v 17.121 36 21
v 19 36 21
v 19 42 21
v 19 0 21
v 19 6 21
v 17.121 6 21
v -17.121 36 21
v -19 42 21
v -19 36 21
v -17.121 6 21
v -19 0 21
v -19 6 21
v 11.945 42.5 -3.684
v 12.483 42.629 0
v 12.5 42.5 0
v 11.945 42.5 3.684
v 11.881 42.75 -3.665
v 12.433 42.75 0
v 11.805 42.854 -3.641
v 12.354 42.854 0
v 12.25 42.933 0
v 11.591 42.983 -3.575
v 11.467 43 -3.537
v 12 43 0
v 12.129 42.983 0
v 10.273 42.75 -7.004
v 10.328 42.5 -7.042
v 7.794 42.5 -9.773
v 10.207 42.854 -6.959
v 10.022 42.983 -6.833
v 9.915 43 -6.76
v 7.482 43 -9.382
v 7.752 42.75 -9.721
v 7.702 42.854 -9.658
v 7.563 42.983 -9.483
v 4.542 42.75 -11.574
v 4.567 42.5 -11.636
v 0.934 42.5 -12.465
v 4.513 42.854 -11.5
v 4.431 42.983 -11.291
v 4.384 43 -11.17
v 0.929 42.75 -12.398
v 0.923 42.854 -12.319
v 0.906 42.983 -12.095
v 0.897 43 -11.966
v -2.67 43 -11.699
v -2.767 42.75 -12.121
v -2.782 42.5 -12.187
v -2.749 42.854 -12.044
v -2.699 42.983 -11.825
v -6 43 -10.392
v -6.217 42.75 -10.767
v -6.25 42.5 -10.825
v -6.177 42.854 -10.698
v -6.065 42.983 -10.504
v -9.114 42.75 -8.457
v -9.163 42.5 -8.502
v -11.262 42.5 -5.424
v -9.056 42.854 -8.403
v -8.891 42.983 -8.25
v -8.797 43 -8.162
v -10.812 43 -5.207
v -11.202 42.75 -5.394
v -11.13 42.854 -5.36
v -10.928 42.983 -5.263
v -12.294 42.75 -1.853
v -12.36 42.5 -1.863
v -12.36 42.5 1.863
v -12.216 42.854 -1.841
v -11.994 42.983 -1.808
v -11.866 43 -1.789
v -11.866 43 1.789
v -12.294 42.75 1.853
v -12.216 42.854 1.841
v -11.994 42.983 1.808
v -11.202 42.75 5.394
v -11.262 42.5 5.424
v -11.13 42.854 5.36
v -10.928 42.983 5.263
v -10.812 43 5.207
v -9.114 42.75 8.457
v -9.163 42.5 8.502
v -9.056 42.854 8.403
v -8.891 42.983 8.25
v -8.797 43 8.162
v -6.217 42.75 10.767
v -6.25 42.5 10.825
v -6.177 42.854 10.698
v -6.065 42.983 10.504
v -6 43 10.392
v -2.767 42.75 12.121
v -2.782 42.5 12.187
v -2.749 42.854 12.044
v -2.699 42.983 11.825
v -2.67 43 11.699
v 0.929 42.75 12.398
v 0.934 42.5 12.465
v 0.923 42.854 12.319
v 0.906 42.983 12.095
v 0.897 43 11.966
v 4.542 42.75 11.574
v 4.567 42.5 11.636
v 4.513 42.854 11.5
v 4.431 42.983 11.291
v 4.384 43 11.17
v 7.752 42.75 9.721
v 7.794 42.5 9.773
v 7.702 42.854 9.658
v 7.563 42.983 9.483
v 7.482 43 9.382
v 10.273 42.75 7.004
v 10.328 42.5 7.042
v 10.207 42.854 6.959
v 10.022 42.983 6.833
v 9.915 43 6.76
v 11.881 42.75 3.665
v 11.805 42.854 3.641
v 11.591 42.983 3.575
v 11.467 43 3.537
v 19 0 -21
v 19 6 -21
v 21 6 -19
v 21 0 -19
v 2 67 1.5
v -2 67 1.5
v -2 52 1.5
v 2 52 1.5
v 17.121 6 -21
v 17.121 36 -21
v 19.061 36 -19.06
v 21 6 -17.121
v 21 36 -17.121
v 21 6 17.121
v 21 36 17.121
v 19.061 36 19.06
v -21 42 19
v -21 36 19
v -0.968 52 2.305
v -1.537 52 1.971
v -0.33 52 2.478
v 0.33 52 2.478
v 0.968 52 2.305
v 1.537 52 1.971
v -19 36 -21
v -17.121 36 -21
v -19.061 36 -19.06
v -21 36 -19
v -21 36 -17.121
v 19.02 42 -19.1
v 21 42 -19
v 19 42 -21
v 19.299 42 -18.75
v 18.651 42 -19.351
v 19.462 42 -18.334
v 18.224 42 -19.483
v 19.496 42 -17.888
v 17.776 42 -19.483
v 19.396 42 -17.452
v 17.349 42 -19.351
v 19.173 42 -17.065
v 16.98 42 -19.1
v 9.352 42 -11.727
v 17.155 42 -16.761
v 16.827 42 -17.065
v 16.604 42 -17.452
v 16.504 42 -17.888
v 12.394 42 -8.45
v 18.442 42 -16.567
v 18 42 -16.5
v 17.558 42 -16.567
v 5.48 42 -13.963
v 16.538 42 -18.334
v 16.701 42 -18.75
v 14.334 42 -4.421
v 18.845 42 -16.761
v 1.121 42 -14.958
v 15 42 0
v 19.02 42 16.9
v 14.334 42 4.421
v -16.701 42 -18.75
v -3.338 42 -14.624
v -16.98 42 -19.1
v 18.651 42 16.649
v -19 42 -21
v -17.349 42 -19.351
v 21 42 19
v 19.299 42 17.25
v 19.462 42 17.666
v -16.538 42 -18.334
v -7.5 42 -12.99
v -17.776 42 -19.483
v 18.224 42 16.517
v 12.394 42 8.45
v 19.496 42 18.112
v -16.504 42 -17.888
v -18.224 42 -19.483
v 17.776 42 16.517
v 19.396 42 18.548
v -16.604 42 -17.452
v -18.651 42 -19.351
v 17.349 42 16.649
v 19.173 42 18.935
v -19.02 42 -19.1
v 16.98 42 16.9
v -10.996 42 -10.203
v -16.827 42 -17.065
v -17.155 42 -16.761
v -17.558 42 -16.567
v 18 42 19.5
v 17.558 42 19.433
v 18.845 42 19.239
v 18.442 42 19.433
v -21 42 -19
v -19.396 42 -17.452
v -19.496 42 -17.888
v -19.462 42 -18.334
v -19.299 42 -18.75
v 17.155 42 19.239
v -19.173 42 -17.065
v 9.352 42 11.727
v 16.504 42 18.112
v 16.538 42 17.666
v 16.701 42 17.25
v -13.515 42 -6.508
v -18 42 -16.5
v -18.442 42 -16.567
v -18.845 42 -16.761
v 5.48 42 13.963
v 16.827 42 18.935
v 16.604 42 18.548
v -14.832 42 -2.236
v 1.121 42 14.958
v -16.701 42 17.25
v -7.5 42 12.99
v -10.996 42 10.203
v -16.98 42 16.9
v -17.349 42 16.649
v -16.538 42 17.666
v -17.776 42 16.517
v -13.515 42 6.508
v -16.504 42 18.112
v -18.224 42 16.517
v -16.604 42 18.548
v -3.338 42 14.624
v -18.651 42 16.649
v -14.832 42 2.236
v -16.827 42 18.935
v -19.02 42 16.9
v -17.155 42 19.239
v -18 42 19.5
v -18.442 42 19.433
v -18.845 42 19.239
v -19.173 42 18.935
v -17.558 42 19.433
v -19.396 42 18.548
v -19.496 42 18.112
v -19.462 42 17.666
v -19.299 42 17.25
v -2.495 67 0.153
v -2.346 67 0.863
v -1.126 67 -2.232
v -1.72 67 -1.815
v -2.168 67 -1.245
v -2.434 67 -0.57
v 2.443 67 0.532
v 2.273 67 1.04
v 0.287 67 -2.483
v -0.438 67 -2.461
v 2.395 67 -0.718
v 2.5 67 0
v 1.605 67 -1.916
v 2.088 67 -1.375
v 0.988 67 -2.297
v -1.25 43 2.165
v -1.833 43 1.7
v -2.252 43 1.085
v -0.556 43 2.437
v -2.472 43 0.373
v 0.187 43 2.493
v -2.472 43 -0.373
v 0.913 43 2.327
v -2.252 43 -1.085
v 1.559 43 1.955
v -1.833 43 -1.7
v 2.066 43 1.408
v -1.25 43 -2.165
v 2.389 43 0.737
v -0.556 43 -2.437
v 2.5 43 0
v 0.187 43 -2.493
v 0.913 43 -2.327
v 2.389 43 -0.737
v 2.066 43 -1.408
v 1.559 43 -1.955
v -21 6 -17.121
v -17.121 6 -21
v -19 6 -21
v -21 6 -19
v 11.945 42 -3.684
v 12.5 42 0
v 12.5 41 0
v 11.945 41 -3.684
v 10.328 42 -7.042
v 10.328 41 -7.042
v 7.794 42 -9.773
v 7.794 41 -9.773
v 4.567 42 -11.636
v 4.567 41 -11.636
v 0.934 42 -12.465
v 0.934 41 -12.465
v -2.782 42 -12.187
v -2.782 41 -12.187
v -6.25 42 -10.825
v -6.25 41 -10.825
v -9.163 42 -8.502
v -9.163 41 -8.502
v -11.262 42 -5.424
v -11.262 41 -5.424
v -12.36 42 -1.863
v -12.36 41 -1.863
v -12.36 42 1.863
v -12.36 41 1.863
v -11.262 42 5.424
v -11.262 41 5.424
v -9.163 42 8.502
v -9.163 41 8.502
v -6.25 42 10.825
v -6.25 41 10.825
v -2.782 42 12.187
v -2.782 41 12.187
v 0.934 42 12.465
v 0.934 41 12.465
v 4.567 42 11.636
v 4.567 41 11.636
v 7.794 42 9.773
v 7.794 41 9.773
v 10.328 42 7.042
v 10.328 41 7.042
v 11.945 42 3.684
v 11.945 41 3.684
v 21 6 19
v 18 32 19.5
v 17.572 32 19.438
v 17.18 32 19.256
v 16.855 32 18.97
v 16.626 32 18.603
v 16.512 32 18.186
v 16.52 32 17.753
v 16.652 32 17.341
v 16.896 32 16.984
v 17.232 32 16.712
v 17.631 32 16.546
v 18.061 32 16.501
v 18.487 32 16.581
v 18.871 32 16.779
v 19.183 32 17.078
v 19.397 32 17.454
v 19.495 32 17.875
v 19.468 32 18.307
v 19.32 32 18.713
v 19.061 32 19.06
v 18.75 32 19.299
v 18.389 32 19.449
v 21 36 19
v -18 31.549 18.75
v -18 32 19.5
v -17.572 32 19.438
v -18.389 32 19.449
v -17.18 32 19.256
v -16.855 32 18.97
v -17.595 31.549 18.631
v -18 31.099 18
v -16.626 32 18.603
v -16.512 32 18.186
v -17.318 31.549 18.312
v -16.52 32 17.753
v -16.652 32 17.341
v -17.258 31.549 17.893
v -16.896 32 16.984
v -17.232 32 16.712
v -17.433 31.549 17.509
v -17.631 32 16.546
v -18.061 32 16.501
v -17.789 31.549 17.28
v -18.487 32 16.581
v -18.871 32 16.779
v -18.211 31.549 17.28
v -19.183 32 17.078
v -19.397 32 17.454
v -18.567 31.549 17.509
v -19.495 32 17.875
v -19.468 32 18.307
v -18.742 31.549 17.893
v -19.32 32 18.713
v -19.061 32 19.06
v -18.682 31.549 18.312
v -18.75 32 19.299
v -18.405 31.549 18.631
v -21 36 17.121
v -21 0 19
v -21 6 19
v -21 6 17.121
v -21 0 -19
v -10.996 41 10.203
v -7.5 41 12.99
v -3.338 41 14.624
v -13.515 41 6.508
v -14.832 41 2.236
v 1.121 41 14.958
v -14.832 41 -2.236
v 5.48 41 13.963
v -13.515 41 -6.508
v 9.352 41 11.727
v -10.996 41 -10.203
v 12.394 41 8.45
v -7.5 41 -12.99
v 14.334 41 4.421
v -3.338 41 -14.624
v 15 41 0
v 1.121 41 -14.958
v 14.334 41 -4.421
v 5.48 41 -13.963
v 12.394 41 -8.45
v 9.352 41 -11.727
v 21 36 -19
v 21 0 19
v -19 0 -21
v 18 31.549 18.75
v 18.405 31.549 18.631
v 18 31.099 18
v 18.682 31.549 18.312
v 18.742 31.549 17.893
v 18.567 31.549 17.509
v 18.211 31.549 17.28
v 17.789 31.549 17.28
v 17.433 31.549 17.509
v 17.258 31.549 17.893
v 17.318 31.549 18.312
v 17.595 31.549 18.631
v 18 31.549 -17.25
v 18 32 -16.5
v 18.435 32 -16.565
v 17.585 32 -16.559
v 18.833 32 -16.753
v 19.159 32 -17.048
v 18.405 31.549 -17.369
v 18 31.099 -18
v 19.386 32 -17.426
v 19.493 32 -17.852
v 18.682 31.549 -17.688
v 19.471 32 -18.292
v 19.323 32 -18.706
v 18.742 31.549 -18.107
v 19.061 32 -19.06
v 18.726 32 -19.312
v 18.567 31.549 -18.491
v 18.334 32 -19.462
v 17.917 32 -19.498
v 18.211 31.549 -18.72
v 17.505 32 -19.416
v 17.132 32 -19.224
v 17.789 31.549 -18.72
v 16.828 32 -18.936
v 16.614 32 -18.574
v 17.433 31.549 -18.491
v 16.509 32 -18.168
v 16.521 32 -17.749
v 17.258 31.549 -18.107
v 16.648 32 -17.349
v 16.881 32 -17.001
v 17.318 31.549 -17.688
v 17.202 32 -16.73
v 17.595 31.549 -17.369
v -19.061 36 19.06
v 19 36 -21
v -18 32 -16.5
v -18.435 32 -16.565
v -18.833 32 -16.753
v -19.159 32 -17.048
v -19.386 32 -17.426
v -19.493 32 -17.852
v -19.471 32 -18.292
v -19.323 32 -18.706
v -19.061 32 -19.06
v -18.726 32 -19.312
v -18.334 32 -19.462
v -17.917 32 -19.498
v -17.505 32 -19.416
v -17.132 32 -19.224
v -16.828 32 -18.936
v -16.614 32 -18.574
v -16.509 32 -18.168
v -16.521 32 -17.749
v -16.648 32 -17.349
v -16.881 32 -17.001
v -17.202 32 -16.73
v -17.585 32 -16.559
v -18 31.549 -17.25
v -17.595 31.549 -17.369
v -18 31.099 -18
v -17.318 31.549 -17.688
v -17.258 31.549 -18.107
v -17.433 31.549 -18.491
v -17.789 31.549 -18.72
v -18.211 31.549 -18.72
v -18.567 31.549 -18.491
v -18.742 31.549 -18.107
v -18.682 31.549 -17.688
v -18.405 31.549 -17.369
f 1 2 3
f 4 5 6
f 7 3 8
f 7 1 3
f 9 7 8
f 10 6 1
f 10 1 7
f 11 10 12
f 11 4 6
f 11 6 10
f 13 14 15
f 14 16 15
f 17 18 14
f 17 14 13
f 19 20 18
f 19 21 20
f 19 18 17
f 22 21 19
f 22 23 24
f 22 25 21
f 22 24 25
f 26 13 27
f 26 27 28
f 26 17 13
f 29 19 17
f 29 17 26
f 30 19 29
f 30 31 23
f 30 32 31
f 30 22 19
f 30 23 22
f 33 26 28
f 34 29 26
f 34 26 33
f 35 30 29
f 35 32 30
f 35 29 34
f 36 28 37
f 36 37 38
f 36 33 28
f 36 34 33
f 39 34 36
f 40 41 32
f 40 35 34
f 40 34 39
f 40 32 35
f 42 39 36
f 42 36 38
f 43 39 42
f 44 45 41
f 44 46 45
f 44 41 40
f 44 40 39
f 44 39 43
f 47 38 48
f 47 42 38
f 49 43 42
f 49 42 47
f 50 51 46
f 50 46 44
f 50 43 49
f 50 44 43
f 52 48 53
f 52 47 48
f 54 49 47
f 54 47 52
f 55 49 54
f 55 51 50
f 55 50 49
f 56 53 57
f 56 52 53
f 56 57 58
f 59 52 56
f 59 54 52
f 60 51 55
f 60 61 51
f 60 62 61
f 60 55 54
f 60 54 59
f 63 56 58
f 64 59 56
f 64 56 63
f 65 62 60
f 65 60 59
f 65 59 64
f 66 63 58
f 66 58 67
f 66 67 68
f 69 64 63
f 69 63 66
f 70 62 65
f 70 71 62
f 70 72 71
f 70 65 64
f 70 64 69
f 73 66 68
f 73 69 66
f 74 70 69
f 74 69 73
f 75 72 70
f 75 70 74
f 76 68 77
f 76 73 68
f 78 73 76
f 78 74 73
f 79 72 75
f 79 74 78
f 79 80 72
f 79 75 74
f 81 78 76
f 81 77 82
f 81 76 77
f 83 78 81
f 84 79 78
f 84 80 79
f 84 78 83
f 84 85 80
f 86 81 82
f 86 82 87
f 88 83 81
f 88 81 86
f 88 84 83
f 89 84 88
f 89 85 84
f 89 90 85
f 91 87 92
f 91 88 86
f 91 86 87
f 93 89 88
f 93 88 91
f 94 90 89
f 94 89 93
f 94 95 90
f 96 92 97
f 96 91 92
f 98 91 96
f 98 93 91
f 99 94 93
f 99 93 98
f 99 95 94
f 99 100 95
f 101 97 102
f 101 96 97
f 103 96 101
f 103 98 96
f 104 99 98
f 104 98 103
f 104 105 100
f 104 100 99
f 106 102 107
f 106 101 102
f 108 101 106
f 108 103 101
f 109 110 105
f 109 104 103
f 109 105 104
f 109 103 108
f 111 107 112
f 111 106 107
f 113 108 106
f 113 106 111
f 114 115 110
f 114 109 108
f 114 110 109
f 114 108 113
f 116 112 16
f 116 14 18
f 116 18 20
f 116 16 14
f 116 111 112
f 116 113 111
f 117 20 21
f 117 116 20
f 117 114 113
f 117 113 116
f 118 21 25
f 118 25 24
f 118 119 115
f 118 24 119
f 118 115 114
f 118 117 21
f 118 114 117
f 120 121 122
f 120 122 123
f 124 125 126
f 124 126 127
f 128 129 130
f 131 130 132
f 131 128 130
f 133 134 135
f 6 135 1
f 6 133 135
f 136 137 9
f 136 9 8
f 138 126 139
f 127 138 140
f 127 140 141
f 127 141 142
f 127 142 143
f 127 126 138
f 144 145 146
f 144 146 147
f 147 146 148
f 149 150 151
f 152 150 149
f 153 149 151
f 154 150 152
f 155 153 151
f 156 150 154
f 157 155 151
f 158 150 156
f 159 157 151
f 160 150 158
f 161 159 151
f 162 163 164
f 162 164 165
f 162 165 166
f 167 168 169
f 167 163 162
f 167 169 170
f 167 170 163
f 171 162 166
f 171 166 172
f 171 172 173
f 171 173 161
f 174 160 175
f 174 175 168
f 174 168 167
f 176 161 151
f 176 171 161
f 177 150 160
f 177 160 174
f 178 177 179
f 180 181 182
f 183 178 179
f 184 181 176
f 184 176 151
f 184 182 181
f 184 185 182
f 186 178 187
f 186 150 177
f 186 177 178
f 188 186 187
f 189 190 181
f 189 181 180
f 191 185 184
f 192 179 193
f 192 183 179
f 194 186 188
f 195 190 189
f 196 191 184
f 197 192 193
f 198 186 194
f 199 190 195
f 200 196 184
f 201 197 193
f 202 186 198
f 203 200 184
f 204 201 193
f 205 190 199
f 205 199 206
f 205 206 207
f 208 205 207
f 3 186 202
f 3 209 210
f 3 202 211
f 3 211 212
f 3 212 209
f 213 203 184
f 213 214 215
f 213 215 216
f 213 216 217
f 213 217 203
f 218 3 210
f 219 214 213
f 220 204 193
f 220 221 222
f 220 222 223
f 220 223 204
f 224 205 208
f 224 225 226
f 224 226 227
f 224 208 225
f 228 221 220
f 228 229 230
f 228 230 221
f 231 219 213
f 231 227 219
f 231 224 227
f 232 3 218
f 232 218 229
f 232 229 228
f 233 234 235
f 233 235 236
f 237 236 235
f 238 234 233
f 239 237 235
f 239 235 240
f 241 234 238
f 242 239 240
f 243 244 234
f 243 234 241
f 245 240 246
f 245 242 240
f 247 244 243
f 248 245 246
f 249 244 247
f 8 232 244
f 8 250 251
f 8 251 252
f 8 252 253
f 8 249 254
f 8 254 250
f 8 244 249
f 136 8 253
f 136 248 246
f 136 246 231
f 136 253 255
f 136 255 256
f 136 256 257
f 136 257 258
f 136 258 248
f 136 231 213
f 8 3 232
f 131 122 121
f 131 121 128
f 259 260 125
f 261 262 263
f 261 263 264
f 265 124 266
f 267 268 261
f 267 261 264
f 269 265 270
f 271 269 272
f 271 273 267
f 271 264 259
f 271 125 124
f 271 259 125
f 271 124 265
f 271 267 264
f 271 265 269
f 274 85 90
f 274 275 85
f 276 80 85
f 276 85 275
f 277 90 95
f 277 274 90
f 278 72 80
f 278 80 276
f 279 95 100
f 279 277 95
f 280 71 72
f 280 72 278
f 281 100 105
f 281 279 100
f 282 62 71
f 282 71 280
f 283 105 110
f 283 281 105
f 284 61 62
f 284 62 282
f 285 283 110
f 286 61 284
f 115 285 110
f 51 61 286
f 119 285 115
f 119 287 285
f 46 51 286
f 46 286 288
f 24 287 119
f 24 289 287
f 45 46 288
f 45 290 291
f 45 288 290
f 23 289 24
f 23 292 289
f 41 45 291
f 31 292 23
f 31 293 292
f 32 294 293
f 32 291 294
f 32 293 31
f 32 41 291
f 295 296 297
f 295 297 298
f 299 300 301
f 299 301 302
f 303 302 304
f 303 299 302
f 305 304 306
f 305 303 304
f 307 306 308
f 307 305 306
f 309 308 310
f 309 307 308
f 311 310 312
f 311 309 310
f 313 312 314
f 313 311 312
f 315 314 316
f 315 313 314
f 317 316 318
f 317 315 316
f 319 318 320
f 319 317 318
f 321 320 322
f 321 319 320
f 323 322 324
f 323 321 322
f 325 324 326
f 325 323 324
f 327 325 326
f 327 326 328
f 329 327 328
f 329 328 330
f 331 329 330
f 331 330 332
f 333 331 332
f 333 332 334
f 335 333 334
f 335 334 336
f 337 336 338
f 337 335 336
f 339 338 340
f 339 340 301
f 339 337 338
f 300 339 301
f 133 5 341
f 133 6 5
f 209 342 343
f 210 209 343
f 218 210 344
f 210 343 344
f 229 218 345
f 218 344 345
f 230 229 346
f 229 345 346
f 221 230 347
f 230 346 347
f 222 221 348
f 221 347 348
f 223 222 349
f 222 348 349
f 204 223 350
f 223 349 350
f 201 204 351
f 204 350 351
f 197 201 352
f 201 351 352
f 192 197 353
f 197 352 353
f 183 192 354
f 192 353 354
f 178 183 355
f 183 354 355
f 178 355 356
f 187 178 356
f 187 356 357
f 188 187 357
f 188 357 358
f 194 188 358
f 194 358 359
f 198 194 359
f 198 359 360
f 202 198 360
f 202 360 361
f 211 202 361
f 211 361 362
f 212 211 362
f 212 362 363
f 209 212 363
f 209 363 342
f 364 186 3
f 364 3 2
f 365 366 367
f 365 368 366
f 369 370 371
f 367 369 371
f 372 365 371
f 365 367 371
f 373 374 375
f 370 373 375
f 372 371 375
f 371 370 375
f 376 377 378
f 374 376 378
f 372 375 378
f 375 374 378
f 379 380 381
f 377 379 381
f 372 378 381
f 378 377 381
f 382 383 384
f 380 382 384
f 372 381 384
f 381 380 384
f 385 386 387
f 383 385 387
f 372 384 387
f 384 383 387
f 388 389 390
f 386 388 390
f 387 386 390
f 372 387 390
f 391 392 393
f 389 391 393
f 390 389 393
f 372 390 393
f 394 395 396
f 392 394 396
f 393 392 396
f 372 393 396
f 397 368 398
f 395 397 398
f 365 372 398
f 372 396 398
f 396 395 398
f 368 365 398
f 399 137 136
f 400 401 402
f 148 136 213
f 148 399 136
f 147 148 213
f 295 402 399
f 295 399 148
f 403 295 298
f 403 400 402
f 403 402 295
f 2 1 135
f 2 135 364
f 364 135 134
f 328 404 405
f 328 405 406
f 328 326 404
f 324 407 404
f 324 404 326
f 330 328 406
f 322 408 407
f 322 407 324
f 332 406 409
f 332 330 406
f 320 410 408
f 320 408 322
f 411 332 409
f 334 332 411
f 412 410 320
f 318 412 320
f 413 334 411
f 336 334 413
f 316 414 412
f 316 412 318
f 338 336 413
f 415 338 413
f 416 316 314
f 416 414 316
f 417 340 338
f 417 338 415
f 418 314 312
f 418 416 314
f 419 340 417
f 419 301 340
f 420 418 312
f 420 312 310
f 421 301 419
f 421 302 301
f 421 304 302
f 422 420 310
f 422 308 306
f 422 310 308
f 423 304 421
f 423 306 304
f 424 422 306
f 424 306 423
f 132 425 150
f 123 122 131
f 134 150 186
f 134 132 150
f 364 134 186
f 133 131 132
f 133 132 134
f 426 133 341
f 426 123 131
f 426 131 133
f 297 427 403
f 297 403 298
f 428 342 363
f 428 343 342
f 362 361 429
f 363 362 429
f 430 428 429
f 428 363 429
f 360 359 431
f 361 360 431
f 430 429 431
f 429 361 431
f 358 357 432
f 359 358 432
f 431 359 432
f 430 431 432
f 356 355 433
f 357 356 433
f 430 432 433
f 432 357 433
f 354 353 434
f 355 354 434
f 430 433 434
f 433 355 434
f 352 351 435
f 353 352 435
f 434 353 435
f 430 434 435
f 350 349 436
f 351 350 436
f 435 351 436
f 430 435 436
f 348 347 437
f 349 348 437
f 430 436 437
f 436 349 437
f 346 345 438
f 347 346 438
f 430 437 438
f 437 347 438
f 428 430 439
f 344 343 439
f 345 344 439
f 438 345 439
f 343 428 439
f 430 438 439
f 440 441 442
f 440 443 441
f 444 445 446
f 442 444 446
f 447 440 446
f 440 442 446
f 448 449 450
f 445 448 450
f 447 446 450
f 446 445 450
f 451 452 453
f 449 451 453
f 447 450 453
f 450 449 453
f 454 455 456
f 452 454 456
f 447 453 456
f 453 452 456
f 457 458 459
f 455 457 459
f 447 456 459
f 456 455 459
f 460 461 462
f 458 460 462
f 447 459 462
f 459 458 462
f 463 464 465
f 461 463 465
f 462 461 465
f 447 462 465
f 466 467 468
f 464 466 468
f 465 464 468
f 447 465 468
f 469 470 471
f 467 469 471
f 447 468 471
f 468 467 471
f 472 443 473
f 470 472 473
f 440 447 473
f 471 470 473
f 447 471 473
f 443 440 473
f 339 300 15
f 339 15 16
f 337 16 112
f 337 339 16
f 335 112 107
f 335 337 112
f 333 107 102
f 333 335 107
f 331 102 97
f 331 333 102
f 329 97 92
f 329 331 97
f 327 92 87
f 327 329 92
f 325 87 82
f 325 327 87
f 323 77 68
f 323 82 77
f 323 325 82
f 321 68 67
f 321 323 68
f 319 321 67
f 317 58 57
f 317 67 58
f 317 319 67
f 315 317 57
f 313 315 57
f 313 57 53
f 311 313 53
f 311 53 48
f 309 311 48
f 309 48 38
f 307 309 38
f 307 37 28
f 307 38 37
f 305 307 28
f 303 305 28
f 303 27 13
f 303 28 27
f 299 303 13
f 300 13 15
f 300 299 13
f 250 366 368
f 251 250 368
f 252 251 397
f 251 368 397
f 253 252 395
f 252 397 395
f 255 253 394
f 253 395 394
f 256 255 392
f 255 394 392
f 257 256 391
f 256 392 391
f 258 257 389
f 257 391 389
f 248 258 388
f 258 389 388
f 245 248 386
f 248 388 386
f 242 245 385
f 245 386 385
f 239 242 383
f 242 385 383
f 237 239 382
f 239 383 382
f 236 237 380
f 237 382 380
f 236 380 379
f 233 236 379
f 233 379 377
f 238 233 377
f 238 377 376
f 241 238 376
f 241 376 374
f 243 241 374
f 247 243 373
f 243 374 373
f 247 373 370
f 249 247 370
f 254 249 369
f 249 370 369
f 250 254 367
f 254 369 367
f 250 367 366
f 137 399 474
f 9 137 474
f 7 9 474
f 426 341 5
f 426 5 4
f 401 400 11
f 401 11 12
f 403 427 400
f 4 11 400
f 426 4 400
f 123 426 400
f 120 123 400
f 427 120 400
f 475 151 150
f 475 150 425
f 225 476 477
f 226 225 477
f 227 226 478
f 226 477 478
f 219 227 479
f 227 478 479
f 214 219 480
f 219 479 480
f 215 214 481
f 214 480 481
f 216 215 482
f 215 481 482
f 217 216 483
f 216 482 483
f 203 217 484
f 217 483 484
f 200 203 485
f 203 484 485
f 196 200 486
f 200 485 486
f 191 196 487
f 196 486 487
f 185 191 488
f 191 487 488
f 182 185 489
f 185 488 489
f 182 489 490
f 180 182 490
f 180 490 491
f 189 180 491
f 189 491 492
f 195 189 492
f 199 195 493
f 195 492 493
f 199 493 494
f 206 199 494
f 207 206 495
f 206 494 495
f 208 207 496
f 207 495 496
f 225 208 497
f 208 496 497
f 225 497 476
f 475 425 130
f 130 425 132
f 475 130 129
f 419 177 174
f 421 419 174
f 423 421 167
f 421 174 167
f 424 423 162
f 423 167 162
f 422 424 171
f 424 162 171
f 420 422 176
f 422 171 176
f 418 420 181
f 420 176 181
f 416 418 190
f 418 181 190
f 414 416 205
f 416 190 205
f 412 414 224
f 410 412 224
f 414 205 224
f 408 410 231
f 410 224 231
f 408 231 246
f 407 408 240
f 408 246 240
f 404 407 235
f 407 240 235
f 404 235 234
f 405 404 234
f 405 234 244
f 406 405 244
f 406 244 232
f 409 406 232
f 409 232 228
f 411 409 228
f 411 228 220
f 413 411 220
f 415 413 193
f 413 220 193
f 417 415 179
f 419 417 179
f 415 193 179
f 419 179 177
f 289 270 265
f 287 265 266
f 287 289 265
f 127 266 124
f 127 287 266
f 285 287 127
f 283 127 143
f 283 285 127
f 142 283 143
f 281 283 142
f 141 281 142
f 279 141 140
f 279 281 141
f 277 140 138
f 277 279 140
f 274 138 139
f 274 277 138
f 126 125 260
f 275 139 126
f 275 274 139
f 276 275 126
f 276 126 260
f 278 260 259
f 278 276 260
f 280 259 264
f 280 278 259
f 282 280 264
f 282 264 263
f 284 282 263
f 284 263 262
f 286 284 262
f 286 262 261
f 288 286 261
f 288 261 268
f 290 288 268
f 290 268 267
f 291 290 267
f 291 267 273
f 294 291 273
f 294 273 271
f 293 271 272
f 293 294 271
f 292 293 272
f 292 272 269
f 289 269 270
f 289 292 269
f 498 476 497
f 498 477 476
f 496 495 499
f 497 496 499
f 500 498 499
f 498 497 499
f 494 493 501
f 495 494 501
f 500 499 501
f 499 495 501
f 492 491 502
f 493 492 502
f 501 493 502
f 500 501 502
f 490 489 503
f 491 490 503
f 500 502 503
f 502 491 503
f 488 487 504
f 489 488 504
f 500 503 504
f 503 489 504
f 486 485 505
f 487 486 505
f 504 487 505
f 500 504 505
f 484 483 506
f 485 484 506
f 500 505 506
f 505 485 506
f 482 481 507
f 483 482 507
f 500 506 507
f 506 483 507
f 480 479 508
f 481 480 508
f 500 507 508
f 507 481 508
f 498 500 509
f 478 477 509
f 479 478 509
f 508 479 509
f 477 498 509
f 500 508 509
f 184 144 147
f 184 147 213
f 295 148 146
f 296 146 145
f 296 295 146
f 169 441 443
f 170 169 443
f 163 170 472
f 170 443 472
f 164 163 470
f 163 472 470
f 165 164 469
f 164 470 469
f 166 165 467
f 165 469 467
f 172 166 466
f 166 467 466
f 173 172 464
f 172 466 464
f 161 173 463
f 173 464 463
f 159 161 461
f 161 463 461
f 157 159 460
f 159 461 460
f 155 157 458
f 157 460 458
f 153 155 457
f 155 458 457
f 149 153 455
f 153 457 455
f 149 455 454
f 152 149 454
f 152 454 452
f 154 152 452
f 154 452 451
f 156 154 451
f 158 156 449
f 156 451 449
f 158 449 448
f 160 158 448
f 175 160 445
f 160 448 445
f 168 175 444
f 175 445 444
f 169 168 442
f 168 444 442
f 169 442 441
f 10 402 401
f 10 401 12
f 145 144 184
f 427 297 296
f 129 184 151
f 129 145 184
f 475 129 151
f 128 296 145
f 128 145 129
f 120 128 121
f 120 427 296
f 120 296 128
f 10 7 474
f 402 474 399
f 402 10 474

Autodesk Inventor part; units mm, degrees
sketch "草图1" plane through (0, 0, 0) normal (0, 1, 0) x (-1, 0, 0)
  line L0 (-21, 21) -> (21, 21)
  line L1 (21, 21) -> (21, -21)
  line L2 (21, -21) -> (-21, -21)
  line L3 (-21, -21) -> (-21, 21)
  line L4 (-21, 21) -> (21, -21) construction
  line L5 (21, 21) -> (-21, -21) construction
  point P0 (0, 0)
  dimension "d0" = 42
extrude "拉伸1" add sketch "草图1" along normal blind 42
sketch "草图2" plane through (0, 42, 0) normal (0, 1, 0) x (1, 0, 0)
  circle A0 centre (0, 0) radius 15
  circle A1 centre (0, 0) radius 12.5
  dimension "d3" = 30
  dimension "d4" = 25
extrude "拉伸2" cut sketch "草图2" against normal blind 1
sketch "草图3" plane through (0, 42, 0) normal (0, 1, 0) x (1, 0, 0)
  circle A0 centre (-18, -18) radius 1.5
  line L0 (0, 29.4) -> (0, -29.4) construction
  line L1 (-29.4, 0) -> (29.4, 0) construction
  circle A1 centre (18, -18) radius 1.5
  line L2 (29.4, 0) -> (-29.4, 0) construction
  circle A2 centre (-18, 18) radius 1.5
  circle A3 centre (18, 18) radius 1.5
  point P0 (0, 0)
  dimension "d8" = 3
  dimension "d9" = 18
  dimension "d10" = 18
hole "孔1" at (18, 42, 18) at (-18, 42, 18) at (-18, 42, -18) at (18, 42, -18) direction (0, -1, 0) diameter 3 depth 10 tip angle 118
thread "螺纹1" size "M3x0.5" class "6H" standard "ANSI Metric M Profile" full length
thread "螺纹2" size "M3x0.5" class "6H" standard "ANSI Metric M Profile" full length
thread "螺纹3" size "M3x0.5" class "6H" standard "ANSI Metric M Profile" full length
thread "螺纹4" size "M3x0.5" class "6H" standard "ANSI Metric M Profile" full length
ref_plane "工作平面2" through (0, 42, 0) normal (0, 1, 0) x (1, 0, 0)
sketch "草图4" plane through (0, 42, 0) normal (0, 1, 0) x (1, 0, 0)
  circle A0 centre (0, 0) radius 2.5
  dimension "d26" = 5
extrude "拉伸3" add sketch "草图4" along normal blind 25
ref_plane "工作平面3" through (0, 67, 0) normal (0, 1, 0) x (1, 0, 0)
sketch "草图5" plane through (0, 67, 0) normal (0, 1, 0) x (1, 0, 0)
  circle A0 centre (0, 0) radius 2.5 projected
  line L0 (-2, -1.5) -> (2, -1.5)
  dimension "d29" = 1.5
extrude "拉伸4" cut sketch "草图5" against normal blind 15 contours L0 A0 picked at (-0.533956, -1.639793)
ref_plane "工作平面1" through (0, 21, 0) normal (0, 1, 0) x (1, 0, 0)
sketch "草图6" plane through (0, 21, 0) normal (0, 1, 0) x (1, 0, 0)
  circle A0 centre (-18, -18) radius 1.5
  line L0 (0, 29.4) -> (0, -29.4) construction
  line L1 (29.4, 0) -> (-29.4, 0) construction
  line L2 (-21, 21) -> (-21, -21)
  line L3 (-21, -21) -> (21, -21)
  line L4 (21, -21) -> (21, 21)
  line L5 (21, 21) -> (-21, 21)
  line L6 (-17.12132, -21) -> (-21, -17.12132)
  line L7 (-17.12132, 21) -> (-21, 17.12132)
  line L8 (17.12132, -21) -> (21, -17.12132)
  line L9 (17.12132, 21) -> (21, 17.12132)
  point P0 (0, 0)
  dimension "d34" = 45
sketch "草图6 outline for 拉伸5" plane through (0, 21, 0) normal (0, 1, 0) x (1, 0, 0)
  line L0 (-21, -17.12132) -> (-21, -21)
  line L1 (-17.12132, -21) -> (-21, -17.12132)
  line L2 (-21, -21) -> (-17.12132, -21)
extrude "拉伸5" cut sketch "草图6 outline for 拉伸5" along normal mid plane 30
mirror "镜像1" about plane through (0, 0, 0) normal (1, 0, 0) of "拉伸5"
mirror "镜像2" about plane through (0, 0, 0) normal (0, 0, 1) of "拉伸5", "镜像1"
chamfer "倒角1" distance 2 angle 45 8 edges at (21, 39, -21) (21, 3, -21) (-21, 3, -21) (-21, 39, -21) (21, 39, 21) (21, 3, 21) (-21, 39, 21) (-21, 3, 21)
sketch "草图7" plane through (0, 42, 0) normal (0, 1, 0) x (1, 0, 0)
  circle A0 centre (0, 0) radius 2.5 projected
  circle A1 centre (0, 0) radius 12.5 projected
extrude "拉伸6" add sketch "草图7" along normal blind 1
fillet "圆角2" radius 0.5 1 edges at (-12.5, 43, 0)
properties part number "步进电机"
